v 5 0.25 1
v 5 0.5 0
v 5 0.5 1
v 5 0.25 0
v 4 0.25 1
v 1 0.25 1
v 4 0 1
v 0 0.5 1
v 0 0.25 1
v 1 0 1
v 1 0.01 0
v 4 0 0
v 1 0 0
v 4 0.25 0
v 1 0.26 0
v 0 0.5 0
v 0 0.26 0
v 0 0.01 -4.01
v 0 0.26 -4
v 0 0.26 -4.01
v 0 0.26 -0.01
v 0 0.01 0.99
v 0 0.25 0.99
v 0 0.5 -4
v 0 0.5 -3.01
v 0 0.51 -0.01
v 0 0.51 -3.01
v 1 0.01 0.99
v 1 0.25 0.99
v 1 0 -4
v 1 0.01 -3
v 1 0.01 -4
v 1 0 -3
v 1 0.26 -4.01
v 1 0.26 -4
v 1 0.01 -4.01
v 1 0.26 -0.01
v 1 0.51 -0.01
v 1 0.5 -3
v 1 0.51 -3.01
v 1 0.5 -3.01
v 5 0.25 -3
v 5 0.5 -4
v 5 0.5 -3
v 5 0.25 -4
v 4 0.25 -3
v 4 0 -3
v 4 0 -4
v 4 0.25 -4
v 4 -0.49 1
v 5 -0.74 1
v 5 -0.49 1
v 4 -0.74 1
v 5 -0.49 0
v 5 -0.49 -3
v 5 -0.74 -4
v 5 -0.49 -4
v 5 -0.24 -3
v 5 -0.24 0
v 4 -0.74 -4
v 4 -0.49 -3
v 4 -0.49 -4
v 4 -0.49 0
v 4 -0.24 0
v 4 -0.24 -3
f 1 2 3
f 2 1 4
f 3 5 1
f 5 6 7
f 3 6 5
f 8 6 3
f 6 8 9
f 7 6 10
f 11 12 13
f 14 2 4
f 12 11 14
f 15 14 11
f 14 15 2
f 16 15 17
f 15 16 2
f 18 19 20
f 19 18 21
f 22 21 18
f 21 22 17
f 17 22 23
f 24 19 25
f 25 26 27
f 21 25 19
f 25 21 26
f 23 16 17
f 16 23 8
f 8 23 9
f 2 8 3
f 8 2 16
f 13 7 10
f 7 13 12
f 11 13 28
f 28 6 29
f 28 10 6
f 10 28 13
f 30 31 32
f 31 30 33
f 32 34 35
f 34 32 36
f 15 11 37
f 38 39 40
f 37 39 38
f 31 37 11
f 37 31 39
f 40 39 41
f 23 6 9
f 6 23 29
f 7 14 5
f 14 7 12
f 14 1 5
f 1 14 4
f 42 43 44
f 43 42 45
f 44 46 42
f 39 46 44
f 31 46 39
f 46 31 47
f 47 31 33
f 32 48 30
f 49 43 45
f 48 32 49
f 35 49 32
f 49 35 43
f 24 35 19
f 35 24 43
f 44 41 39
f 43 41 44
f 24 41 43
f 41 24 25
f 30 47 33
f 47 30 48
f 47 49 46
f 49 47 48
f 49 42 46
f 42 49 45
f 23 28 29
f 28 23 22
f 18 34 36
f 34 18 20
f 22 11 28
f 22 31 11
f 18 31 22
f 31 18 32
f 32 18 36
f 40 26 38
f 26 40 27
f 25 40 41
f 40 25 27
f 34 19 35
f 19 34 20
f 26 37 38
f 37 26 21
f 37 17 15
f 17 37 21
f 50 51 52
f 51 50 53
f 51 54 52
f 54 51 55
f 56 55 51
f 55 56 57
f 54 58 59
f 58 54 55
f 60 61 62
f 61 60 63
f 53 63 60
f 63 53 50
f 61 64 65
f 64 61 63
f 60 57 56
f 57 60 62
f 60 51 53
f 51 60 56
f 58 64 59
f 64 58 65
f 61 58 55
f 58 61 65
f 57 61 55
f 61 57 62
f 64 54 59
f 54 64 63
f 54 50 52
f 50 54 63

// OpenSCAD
$vpt = [ 5.02, -1.26, -0.48 ];
$vpr = [ 69.70, 0.00, 57.20 ];
$vpd = 17.56;

module lap_joint() {
    difference() {
        cube([5, 0.5, 1]);
        translate([-1, -0.25, -1]) cube([2, 0.5, 3]);
        translate([4, -0.25, -1]) cube([2, 0.5, 3]);
    }
}

color("#cc9900") {
    lap_joint();
    translate([0, 0, -4]) lap_joint();
}

color("#cccc99") translate([0, -0.24, -4]) {
    translate([0, 0.75, -0.01]) rotate([180, -90, 0]) lap_joint();
    translate([4, 0, 0]) rotate([180, -90, 0]) lap_joint();
}
